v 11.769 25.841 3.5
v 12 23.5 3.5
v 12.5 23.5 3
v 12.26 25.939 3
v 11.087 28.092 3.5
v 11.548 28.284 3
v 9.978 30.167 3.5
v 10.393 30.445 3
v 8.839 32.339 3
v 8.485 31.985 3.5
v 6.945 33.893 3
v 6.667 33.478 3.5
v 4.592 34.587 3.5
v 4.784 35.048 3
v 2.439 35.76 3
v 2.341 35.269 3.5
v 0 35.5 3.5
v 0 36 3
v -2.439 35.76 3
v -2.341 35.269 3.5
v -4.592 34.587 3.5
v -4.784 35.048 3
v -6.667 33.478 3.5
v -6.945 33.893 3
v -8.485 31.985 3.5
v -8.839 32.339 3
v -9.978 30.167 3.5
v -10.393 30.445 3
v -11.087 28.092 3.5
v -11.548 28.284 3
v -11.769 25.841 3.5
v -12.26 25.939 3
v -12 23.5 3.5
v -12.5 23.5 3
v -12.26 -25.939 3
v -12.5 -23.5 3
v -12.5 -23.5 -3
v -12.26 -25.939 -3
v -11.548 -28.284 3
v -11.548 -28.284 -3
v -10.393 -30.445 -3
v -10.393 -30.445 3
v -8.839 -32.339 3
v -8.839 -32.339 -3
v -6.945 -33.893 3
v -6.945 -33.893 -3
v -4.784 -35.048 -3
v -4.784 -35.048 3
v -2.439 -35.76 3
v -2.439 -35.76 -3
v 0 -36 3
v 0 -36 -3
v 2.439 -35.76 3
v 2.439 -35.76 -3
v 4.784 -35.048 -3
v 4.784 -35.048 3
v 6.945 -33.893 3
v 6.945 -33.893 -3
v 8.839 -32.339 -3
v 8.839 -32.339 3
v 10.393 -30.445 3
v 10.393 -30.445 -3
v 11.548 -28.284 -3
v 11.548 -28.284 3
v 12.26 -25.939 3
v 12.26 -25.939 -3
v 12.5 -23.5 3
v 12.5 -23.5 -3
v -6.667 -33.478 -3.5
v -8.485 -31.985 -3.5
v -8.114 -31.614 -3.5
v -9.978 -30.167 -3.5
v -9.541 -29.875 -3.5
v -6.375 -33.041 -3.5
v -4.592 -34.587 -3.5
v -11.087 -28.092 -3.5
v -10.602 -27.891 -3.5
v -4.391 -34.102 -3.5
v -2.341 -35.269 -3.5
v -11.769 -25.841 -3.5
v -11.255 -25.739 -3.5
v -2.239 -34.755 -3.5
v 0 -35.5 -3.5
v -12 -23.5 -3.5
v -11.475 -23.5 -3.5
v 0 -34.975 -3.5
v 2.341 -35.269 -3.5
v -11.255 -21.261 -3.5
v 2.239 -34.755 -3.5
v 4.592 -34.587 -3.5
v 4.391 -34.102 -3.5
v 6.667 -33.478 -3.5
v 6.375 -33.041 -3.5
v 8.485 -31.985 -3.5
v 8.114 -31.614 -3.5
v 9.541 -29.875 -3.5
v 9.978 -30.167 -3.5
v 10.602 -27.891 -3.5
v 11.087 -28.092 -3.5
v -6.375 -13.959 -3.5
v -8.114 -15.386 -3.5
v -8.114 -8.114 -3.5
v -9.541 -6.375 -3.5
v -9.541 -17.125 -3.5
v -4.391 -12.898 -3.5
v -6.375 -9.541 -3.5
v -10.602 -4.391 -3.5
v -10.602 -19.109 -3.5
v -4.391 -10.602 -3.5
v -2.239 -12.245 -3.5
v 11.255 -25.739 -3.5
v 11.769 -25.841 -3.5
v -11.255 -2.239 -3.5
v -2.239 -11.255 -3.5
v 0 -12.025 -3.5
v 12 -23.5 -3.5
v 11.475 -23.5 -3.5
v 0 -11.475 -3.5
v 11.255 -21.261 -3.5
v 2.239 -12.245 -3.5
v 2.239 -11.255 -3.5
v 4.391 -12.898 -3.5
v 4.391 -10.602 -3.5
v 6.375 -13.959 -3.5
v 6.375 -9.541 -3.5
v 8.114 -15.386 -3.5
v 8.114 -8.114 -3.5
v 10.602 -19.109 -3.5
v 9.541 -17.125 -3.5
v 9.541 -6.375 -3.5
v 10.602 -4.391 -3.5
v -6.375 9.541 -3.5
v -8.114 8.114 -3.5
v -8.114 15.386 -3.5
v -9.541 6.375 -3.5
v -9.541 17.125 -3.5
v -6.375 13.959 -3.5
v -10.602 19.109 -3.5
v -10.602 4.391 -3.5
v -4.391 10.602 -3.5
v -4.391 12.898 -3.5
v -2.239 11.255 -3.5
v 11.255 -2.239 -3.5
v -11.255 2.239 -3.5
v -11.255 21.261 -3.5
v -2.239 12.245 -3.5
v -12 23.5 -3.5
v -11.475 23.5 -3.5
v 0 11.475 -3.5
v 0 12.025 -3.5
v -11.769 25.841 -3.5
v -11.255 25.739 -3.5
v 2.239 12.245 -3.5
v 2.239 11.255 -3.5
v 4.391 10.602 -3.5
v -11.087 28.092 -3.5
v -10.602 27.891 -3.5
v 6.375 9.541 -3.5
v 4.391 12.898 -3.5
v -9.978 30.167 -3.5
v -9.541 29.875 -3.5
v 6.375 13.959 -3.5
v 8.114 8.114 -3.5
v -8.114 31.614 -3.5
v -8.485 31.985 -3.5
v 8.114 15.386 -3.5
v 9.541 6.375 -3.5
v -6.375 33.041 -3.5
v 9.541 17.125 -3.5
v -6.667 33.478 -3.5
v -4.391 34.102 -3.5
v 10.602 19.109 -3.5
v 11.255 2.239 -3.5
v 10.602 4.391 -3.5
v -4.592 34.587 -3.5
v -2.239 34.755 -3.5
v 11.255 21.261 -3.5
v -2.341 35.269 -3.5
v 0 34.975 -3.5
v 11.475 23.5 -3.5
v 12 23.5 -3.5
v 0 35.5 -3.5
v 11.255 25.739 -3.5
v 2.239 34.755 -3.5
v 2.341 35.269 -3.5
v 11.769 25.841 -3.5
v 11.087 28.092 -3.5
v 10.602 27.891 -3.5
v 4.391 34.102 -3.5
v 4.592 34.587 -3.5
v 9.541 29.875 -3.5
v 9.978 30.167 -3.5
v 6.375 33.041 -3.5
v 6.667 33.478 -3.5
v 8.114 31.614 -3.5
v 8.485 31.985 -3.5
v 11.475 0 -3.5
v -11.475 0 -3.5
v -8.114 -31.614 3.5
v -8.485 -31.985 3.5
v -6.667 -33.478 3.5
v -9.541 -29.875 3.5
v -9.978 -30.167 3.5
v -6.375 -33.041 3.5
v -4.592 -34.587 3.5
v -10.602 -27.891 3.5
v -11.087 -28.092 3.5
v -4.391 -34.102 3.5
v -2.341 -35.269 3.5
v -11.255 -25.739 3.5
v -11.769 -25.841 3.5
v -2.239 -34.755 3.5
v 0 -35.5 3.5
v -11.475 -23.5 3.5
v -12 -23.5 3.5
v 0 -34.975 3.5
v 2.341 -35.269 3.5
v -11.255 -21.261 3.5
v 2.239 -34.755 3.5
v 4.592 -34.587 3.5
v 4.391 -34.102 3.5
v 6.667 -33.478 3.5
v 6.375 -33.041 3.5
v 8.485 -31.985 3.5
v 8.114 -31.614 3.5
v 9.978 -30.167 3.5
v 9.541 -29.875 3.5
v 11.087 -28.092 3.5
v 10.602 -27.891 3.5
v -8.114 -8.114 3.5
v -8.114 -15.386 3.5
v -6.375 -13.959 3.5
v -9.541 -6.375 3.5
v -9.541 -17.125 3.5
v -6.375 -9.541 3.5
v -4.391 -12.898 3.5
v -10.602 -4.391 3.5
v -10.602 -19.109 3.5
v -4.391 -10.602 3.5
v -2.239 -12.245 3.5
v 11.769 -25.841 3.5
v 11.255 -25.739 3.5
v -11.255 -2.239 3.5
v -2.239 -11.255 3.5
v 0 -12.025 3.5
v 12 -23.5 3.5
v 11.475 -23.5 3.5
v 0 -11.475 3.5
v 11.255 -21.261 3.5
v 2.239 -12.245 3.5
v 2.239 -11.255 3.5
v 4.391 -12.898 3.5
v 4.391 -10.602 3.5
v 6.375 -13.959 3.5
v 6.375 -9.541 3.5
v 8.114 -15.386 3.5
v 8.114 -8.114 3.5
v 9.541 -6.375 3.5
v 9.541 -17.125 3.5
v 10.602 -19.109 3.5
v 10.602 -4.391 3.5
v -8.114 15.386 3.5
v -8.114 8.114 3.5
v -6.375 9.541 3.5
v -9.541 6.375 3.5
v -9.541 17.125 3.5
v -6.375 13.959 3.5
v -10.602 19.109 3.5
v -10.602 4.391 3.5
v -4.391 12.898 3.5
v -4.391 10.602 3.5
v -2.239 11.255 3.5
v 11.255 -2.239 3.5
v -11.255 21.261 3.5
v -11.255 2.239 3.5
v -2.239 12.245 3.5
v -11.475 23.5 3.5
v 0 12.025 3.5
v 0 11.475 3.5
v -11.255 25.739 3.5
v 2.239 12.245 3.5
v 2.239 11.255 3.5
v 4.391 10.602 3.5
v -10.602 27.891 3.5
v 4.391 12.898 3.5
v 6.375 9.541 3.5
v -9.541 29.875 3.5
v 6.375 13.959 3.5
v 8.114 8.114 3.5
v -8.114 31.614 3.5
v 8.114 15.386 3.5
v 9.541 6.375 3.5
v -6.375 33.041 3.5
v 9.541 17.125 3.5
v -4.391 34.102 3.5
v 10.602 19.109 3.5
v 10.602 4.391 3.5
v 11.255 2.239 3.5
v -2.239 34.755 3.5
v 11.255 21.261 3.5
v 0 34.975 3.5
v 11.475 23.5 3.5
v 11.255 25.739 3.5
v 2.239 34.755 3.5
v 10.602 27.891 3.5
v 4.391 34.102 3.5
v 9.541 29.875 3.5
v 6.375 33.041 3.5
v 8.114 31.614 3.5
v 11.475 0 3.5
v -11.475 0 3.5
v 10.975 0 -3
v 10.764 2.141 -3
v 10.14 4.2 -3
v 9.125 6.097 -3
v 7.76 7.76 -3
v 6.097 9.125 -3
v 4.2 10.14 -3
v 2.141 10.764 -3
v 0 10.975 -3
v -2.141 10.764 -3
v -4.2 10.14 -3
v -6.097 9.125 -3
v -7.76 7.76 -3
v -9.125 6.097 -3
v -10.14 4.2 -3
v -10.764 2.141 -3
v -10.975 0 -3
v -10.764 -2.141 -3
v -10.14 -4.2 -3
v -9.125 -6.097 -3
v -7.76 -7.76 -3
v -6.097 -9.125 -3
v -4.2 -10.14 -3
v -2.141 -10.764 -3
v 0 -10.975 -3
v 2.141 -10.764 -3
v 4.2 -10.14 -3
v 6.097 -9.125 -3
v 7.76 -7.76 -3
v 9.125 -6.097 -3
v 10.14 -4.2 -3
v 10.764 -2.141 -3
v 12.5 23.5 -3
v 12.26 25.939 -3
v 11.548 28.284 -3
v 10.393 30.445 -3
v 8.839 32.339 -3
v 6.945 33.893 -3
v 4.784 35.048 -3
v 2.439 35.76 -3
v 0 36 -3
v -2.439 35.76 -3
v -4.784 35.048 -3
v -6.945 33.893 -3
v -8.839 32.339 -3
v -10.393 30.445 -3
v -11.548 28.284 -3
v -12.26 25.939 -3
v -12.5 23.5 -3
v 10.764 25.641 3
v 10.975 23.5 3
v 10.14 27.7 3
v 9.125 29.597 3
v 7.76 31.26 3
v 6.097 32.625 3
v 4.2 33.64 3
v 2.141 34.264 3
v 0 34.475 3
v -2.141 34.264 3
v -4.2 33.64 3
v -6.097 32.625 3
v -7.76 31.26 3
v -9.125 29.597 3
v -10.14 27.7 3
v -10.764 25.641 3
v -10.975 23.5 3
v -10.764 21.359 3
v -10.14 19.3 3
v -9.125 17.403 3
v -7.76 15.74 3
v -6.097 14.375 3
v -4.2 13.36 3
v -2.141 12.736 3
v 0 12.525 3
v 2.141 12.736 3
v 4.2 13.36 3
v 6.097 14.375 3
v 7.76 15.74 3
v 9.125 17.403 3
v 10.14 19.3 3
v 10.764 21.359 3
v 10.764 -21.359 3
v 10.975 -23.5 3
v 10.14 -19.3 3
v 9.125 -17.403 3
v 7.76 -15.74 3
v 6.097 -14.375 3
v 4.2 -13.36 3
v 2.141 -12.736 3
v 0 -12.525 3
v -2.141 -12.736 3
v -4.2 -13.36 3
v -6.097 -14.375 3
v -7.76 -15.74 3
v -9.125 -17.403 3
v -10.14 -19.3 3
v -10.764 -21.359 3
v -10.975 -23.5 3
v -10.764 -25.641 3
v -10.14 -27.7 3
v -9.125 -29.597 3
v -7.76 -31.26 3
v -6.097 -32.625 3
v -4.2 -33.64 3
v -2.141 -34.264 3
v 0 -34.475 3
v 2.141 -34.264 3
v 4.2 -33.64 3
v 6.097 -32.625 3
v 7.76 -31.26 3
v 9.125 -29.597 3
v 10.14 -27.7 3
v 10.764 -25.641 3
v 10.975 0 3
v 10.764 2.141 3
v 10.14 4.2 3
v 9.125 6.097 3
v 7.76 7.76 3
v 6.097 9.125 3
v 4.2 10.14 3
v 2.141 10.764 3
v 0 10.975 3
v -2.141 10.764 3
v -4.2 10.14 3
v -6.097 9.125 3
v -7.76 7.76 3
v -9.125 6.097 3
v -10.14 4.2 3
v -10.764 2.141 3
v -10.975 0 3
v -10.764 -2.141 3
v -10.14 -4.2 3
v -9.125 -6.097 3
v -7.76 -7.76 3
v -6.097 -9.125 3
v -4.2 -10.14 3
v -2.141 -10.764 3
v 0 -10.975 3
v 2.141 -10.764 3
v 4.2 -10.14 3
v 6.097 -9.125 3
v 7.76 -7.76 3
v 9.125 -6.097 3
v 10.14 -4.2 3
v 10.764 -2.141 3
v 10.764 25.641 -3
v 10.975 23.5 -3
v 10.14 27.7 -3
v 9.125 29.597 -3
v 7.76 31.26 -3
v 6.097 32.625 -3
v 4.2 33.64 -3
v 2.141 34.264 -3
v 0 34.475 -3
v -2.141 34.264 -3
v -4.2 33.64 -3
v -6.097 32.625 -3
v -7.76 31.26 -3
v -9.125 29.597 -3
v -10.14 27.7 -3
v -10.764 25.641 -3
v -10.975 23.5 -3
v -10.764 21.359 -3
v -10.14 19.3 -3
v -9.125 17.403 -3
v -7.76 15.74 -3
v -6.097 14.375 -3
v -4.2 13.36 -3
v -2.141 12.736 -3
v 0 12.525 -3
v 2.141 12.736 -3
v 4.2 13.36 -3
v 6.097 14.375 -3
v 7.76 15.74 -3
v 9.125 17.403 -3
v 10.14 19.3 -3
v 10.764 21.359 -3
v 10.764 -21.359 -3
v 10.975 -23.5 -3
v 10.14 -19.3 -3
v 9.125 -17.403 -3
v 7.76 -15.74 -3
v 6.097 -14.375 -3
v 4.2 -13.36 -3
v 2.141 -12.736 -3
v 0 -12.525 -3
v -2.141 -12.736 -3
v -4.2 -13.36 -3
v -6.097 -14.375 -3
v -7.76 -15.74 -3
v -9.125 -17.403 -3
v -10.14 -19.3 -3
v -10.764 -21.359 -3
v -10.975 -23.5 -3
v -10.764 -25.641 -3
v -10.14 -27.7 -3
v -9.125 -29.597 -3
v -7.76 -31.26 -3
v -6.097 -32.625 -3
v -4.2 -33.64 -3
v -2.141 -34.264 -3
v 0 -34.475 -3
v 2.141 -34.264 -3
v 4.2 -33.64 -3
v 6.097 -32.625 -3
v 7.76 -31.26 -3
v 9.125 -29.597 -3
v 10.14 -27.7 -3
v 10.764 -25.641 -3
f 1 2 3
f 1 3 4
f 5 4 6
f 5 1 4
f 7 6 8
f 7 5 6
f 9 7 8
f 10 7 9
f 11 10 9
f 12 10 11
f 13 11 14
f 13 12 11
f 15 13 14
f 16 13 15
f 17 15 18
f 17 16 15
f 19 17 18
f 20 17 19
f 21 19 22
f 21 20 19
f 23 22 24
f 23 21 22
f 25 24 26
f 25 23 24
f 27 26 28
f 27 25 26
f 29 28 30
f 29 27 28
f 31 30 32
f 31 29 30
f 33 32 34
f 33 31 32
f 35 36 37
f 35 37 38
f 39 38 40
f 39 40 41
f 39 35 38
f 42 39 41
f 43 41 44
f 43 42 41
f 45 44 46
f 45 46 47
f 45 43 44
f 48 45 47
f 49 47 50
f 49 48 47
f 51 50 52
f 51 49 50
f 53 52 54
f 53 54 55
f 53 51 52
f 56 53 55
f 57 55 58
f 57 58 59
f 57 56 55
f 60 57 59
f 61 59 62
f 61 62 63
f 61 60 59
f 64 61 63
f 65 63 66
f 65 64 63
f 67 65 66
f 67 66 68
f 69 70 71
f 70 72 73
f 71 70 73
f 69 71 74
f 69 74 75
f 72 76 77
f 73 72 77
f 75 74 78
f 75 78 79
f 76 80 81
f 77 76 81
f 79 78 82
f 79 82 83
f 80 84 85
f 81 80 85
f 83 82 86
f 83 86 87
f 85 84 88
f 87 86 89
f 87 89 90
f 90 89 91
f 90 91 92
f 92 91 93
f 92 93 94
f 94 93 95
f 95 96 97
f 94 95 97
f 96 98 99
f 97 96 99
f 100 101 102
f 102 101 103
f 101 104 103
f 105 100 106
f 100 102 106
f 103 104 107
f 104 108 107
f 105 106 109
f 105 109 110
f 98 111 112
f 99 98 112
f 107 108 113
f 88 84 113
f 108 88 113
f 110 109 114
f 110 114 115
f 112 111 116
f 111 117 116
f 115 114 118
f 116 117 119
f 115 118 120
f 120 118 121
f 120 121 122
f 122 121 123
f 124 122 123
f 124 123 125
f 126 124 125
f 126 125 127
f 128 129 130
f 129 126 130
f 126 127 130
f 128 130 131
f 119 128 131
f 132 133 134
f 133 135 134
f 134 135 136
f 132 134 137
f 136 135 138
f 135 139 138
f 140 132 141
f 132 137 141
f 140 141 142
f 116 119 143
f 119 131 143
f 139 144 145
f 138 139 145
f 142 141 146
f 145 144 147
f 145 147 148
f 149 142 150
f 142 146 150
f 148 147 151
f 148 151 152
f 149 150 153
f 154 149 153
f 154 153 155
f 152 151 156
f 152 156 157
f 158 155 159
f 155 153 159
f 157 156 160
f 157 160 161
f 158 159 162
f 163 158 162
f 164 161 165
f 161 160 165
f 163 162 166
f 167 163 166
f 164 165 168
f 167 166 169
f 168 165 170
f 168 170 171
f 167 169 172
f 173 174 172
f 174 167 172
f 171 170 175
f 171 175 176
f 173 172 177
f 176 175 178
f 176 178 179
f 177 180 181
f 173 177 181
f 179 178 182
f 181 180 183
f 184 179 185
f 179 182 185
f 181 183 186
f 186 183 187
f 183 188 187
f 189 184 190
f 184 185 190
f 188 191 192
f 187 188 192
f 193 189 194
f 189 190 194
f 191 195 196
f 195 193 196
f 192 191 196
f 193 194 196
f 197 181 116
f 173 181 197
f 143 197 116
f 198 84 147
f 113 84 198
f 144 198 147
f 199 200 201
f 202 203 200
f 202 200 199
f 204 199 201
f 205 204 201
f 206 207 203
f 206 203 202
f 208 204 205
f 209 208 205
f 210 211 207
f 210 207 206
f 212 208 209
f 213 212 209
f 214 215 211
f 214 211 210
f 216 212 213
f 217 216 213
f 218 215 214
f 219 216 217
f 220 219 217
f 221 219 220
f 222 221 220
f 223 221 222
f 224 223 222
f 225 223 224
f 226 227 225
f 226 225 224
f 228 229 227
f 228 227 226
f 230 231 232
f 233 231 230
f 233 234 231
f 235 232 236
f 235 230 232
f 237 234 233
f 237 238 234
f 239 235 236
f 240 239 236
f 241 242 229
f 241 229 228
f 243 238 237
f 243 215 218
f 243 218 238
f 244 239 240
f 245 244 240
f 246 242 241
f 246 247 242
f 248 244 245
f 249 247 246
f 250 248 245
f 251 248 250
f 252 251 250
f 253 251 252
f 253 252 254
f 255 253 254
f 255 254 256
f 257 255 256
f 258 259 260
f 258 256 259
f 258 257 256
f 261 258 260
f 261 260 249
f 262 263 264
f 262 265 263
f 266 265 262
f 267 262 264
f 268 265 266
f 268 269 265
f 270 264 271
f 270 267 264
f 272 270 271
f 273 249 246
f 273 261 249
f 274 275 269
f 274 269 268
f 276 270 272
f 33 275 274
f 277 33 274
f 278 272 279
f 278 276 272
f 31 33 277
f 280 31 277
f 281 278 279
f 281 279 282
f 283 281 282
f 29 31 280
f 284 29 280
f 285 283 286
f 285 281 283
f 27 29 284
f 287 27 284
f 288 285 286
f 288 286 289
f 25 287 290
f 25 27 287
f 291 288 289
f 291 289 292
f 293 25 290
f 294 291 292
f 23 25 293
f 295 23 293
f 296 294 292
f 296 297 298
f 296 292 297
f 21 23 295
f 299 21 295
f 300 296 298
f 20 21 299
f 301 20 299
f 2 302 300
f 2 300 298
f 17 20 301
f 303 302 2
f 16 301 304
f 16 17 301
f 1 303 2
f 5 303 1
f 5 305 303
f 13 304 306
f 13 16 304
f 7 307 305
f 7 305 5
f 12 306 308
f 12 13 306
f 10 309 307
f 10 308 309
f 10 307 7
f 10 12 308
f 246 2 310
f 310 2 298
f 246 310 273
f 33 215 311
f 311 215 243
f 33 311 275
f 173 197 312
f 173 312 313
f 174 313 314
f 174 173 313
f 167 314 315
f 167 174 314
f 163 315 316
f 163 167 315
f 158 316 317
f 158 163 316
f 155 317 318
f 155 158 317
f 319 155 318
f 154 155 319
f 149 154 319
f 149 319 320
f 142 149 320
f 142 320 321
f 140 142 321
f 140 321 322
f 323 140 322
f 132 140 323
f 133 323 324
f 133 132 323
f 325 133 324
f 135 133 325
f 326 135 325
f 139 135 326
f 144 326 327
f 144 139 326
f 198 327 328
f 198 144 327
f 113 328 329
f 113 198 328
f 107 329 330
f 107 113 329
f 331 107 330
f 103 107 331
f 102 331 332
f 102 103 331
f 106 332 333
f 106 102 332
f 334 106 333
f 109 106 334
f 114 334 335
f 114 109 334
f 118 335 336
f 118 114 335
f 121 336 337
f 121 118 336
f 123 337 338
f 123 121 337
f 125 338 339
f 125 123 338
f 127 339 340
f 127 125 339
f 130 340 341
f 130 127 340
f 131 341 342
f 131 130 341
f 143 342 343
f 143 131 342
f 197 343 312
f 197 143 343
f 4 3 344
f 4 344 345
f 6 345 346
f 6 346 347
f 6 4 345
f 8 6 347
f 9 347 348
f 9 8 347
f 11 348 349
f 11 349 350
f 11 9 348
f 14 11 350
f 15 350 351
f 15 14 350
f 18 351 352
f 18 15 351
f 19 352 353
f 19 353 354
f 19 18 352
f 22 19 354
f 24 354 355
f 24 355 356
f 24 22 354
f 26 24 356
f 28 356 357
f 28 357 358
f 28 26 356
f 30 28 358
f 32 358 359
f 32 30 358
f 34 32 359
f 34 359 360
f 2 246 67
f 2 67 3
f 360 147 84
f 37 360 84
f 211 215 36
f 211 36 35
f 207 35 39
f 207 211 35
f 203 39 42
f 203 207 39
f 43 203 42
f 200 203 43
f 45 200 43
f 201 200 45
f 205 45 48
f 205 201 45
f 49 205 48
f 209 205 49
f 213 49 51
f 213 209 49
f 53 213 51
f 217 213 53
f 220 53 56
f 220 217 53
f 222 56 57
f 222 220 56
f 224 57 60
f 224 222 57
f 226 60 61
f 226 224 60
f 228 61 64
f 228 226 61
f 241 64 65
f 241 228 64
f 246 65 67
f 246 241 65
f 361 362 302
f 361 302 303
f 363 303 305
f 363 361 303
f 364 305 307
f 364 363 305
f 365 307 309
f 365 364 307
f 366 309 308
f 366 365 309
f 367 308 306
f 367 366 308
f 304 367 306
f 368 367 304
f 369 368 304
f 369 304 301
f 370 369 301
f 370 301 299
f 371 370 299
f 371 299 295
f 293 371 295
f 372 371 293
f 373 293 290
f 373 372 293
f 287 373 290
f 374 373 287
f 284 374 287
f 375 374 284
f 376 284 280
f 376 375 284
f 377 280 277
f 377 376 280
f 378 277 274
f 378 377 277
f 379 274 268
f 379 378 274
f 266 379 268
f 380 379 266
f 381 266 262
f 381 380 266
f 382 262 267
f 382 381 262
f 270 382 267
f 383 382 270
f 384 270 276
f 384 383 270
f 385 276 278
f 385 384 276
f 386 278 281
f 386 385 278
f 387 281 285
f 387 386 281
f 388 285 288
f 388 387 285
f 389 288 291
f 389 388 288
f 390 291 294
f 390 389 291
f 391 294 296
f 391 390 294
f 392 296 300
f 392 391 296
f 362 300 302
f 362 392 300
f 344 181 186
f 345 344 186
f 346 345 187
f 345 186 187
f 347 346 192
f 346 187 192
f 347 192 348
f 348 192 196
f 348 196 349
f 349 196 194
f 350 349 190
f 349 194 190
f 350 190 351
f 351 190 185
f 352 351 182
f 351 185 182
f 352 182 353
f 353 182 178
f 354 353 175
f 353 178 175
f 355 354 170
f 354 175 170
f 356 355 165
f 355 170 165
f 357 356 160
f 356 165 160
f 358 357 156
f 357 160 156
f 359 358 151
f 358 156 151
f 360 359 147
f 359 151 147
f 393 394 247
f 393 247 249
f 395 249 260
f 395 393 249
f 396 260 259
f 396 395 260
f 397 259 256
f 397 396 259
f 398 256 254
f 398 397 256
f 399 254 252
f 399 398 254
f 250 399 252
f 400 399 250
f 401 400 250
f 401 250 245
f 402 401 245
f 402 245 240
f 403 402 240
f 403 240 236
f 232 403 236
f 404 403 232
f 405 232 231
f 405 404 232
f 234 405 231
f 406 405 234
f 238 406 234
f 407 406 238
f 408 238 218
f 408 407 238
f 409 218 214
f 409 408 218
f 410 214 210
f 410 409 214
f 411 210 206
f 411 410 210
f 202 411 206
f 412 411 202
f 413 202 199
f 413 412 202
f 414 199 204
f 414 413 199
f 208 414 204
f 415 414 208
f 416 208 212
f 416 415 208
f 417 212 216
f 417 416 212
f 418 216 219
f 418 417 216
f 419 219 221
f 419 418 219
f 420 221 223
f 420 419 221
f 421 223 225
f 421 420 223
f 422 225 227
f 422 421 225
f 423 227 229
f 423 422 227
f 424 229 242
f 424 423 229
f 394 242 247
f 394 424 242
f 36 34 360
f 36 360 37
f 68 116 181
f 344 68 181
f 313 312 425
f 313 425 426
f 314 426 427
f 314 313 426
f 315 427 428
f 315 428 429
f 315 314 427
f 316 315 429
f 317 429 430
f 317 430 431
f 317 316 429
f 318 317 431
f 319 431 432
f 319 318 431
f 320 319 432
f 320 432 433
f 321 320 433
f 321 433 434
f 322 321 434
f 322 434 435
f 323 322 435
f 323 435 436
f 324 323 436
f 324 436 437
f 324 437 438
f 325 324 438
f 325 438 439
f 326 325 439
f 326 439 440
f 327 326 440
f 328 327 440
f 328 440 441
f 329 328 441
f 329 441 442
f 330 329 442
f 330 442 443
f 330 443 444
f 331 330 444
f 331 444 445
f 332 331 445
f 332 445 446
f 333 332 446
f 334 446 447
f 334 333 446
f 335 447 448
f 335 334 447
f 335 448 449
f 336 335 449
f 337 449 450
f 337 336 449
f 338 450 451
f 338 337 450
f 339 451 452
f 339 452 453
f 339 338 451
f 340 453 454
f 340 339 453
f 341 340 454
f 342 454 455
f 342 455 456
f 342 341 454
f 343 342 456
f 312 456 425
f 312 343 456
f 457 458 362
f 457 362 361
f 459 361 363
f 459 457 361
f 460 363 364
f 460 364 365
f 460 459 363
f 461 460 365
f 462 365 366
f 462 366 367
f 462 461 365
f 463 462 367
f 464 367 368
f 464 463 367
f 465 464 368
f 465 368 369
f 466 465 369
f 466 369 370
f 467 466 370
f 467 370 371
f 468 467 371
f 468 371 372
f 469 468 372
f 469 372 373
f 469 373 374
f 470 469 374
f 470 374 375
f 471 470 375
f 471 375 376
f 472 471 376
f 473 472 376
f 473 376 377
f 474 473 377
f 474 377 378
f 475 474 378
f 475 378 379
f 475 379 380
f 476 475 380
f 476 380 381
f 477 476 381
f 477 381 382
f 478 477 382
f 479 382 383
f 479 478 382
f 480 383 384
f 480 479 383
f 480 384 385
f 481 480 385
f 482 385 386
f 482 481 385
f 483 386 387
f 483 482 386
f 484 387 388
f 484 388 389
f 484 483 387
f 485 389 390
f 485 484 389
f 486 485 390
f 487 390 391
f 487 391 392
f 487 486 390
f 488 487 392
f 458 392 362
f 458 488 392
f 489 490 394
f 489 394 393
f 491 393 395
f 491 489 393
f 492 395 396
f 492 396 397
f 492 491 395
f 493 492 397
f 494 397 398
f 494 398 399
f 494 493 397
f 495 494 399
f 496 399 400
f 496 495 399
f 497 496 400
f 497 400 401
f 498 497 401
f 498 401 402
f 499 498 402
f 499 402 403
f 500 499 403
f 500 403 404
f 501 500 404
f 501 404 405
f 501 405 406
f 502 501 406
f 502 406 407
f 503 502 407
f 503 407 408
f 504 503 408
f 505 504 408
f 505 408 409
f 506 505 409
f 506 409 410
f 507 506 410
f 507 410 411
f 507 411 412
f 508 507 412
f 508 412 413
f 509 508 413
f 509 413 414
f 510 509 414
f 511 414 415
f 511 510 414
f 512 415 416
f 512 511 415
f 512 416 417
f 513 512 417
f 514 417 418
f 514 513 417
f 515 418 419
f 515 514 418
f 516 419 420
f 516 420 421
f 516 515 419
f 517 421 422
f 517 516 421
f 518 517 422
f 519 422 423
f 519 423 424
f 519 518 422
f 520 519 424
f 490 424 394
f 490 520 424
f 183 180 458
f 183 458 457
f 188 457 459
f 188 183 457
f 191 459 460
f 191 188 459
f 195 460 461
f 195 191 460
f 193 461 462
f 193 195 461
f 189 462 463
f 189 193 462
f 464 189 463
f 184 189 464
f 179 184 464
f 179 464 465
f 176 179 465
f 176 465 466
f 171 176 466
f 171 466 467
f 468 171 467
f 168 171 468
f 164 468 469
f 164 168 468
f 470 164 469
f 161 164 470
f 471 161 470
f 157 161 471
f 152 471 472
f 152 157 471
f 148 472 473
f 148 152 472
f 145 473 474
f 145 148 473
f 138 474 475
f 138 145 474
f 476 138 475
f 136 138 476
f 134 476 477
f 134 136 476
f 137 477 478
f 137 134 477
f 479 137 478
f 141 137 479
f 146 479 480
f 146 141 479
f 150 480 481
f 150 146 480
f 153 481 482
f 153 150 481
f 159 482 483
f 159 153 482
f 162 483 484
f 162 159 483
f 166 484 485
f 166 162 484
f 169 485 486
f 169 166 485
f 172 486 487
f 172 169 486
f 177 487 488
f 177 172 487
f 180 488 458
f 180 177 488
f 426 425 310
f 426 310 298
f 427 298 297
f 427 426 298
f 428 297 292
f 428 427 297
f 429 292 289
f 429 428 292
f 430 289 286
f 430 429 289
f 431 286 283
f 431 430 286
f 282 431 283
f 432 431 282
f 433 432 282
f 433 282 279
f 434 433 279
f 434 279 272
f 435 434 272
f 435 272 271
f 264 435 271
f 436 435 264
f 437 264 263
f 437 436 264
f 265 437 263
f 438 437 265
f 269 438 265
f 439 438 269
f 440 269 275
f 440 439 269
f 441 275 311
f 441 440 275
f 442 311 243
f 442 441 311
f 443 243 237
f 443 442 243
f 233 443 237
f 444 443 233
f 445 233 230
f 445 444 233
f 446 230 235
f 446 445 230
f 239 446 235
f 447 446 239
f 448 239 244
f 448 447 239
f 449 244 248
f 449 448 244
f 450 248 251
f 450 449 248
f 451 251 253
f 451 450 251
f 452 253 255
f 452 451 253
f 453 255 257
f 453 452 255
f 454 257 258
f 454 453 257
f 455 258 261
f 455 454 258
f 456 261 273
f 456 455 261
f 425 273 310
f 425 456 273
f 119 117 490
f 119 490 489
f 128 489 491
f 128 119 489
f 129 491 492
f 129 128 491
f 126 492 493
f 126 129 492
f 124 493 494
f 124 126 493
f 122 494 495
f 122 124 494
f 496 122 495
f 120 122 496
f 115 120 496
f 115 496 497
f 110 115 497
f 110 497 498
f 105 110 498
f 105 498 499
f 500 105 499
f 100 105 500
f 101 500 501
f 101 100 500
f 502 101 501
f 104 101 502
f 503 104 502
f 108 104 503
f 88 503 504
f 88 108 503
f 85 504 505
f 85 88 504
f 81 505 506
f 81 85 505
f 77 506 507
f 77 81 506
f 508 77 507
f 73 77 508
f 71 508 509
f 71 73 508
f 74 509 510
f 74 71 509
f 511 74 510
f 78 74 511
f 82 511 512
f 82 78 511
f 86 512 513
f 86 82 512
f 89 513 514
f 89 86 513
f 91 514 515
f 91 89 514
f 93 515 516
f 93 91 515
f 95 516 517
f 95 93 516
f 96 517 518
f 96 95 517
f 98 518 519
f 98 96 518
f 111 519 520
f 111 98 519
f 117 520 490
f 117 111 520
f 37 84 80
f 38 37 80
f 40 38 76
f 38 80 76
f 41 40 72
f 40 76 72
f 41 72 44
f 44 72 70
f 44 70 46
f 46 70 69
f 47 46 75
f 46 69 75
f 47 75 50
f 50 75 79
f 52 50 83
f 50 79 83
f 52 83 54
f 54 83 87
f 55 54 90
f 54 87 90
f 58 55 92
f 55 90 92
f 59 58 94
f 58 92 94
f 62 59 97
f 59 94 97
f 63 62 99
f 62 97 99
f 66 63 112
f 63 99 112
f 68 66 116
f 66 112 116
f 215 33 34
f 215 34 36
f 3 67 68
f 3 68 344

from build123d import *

# Parameters (mm, degrees)
F0_R     = 10.975
F1_DEPTH = 3.5
F2_SIZE  = 0.5


with BuildPart() as f1:
    # F0 (on Top) → F1 (new body, symmetric)
    with BuildSketch(Plane.XY):
        with BuildLine():
            Line((12.5, -23.5), (12.5, 23.5))
            ThreePointArc((12.5, 23.5), (0, 36), (-12.5, 23.5))
            Line((-12.5, 23.5), (-12.5, -23.5))
            ThreePointArc((-12.5, -23.5), (0, -36), (12.5, -23.5))
        make_face()
        with Locations((0, -23.5)):
            Circle(F0_R, mode=Mode.SUBTRACT)
        Circle(F0_R, mode=Mode.SUBTRACT)
        with Locations((0, 23.5)):
            Circle(F0_R, mode=Mode.SUBTRACT)
    extrude(amount=F1_DEPTH, both=True)

    # F2
    f2_edges = [f1.edges().sort_by_distance(p)[0] for p in [
        (12.5, 0, -3.5),
        (0, 36, -3.5),
        (-12.5, 0, -3.5),
        (0, -36, -3.5),
        (-10.975, -23.5, -3.5),
        (-10.975, 0, -3.5),
        (-10.975, 23.5, -3.5),
        (12.5, 0, 3.5),
        (0, 36, 3.5),
        (-12.5, 0, 3.5),
        (0, -36, 3.5),
        (-10.975, -23.5, 3.5),
        (-10.975, 0, 3.5),
        (-10.975, 23.5, 3.5),
    ]]
    chamfer(f2_edges, length=F2_SIZE)


solid = f1.part
